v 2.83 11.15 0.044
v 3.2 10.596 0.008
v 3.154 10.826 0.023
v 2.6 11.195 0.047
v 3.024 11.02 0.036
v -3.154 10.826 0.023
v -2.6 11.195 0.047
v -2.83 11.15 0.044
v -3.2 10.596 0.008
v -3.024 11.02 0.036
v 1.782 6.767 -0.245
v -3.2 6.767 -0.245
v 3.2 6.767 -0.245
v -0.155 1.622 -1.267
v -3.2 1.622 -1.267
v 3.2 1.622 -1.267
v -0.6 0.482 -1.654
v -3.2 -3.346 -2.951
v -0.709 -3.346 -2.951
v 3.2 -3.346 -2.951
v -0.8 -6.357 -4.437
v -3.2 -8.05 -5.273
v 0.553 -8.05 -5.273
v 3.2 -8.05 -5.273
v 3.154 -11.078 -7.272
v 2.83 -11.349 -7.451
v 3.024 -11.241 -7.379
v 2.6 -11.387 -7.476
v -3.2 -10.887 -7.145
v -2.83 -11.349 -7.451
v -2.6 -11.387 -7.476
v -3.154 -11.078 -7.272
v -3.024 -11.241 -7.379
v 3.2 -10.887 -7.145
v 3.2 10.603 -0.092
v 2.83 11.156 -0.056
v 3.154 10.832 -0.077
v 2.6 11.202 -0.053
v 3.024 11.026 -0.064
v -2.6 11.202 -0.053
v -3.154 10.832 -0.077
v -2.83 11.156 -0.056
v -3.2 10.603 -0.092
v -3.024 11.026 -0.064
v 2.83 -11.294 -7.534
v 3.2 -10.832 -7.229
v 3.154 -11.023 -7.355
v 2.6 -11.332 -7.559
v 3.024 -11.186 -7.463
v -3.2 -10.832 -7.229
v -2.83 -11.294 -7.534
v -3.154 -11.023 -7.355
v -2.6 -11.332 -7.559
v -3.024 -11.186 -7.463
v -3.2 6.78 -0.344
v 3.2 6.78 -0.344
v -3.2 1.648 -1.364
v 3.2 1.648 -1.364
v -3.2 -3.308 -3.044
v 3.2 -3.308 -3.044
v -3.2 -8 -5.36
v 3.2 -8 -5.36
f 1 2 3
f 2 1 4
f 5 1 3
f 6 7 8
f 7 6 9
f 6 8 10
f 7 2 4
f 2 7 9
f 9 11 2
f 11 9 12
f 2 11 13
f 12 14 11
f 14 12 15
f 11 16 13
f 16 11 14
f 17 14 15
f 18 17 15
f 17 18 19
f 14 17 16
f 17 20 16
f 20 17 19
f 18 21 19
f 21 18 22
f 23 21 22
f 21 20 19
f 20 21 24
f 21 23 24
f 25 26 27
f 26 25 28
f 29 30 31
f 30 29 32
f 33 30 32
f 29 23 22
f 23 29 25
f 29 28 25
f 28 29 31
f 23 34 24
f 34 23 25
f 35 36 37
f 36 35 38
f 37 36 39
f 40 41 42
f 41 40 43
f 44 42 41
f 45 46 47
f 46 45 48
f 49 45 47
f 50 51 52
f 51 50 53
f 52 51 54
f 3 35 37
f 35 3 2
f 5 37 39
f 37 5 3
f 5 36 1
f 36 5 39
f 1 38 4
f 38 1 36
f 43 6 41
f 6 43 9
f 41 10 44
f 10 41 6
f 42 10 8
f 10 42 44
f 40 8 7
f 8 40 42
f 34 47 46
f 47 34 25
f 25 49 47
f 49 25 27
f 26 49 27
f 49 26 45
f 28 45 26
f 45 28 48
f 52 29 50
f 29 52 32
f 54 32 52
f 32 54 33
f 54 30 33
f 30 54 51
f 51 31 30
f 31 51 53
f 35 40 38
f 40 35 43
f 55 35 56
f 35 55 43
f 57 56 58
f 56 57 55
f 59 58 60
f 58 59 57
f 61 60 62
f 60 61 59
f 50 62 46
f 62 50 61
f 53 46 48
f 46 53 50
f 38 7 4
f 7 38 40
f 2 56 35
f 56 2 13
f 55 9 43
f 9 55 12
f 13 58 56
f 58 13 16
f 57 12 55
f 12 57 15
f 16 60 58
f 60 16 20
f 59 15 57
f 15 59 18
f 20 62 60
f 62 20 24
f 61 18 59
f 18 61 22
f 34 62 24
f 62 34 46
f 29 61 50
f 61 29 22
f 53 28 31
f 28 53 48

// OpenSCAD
// file: ../p/empty.scad
use <../lib.scad>
function ldraw_lib__empty() = [
// 0 Empty
// 0 Name: empty.dat
// 0 Author: Steffen [Steffen]
// 0 !LDRAW_ORG Primitive UPDATE 2015-01
// 0 !LICENSE Licensed under CC BY 4.0 : see CAreadme.txt
// 
// 0 BFC CERTIFY CCW
  [0,"BFC","CERTIFY"],
  [0,"BFC","CCW"],
// 
// 0 !HISTORY 2015-10-11 [PTadmin] Official Update 2015-01
// 
// 
// 0 // Tool MLCad cannot handle really empty files. This file is used as a workaround.
// 0 // It exceptionally contains forbidden non-LDRAW standard syntax to satisfy MLCad until it is fixed OR a different editor has become the de-facto LDRAW standard.
// 0 // The line being used here is an "impossible" conditional line which never should be visible,
// 0 // additionally hidden by a syntax explicitly hiding it from displaying.
// 
// 0 MLCAD HIDE 5 24 0 0 0 0.0001 0 0 0.0001 -0.0001 0 0 0 0
];
module ldraw_lib__empty(step=0, col=false, unit=2/5, alt=false, line=0.2, solid=!$preview)
    makepoly(ldraw_lib__empty(), step=step, col=col, unit=unit, alt=alt, line=line, solid=solid);
ldraw_lib__empty(line=0.2);
// file: ../p/1-4cyli.scad
use <../lib.scad>
function ldraw_lib__1_4cyli() = [
// 0 Cylinder 0.25
// 0 Name: 1-4cyli.dat
// 0 Author: James Jessiman
// 0 !LDRAW_ORG Primitive UPDATE 2012-01
// 0 !LICENSE Licensed under CC BY 4.0 : see CAreadme.txt
// 
// 0 BFC CERTIFY CCW
  [0,"BFC","CERTIFY"],
  [0,"BFC","CCW"],
// 
// 0 !HISTORY 2002-03-23 [sbliss] Added BFC statement.
// 0 !HISTORY 2002-04-25 [PTadmin] Official Update 2002-02
// 0 !HISTORY 2007-06-22 [PTadmin] Header formatted for Contributor Agreement
// 0 !HISTORY 2008-07-01 [PTadmin] Official Update 2008-01
// 0 !HISTORY 2012-02-16 [Philo] Changed to CCW
// 0 !HISTORY 2012-03-30 [PTadmin] Official Update 2012-01
// 
// 
// 4 16 1 1 0 0.9239 1 0.3827 0.9239 0 0.3827 1 0 0
  [4,16,1,1,0,0.9239,1,0.3827,0.9239,0,0.3827,1,0,0],
// 5 24 1 0 0 1 1 0 0.9239 0 0.3827 1 0 -1
  [5,24,1,0,0,1,1,0,0.9239,0,0.3827,1,0,-1],
// 4 16 0.9239 1 0.3827 0.7071 1 0.7071 0.7071 0 0.7071 0.9239 0 0.3827
  [4,16,0.9239,1,0.3827,0.7071,1,0.7071,0.7071,0,0.7071,0.9239,0,0.3827],
// 5 24 0.9239 0 0.3827 0.9239 1 0.3827 0.7071 0 0.7071 1 0 0
  [5,24,0.9239,0,0.3827,0.9239,1,0.3827,0.7071,0,0.7071,1,0,0],
// 4 16 0.7071 1 0.7071 0.3827 1 0.9239 0.3827 0 0.9239 0.7071 0 0.7071
  [4,16,0.7071,1,0.7071,0.3827,1,0.9239,0.3827,0,0.9239,0.7071,0,0.7071],
// 5 24 0.7071 0 0.7071 0.7071 1 0.7071 0.3827 0 0.9239 0.9239 0 0.3827
  [5,24,0.7071,0,0.7071,0.7071,1,0.7071,0.3827,0,0.9239,0.9239,0,0.3827],
// 4 16 0.3827 1 0.9239 0 1 1 0 0 1 0.3827 0 0.9239
  [4,16,0.3827,1,0.9239,0,1,1,0,0,1,0.3827,0,0.9239],
// 5 24 0.3827 0 0.9239 0.3827 1 0.9239 0 0 1 0.7071 0 0.7071
  [5,24,0.3827,0,0.9239,0.3827,1,0.9239,0,0,1,0.7071,0,0.7071],
// 5 24 0 0 1 0 1 1 0.3827 0 0.9239 -1 0 1
  [5,24,0,0,1,0,1,1,0.3827,0,0.9239,-1,0,1],
];
module ldraw_lib__1_4cyli(step=0, col=false, unit=2/5, alt=false, line=0.2, solid=!$preview)
    makepoly(ldraw_lib__1_4cyli(), step=step, col=col, unit=unit, alt=alt, line=line, solid=solid);
ldraw_lib__1_4cyli(line=0.2);
// file: ../p/3-16chrd.scad
use <../lib.scad>
function ldraw_lib__3_16chrd() = [
// 0 Chord 0.1875
// 0 Name: 3-16chrd.dat
// 0 Author: Niels Karsdorp [nielsk]
// 0 !LDRAW_ORG Primitive UPDATE 2009-01
// 0 !LICENSE Licensed under CC BY 4.0 : see CAreadme.txt
// 
// 0 BFC CERTIFY CCW
  [0,"BFC","CERTIFY"],
  [0,"BFC","CCW"],
// 
// 0 !HISTORY 2009-05-02 [PTadmin] Official Update 2009-01
// 
// 
// 4 16 1 0 0 0.9239 0 0.3827 0.7071 0 0.7071 0.3827 0 0.9239
  [4,16,1,0,0,0.9239,0,0.3827,0.7071,0,0.7071,0.3827,0,0.9239],
// 0
// 
];
module ldraw_lib__3_16chrd(step=0, col=false, unit=2/5, alt=false, line=0.2, solid=!$preview)
    makepoly(ldraw_lib__3_16chrd(), step=step, col=col, unit=unit, alt=alt, line=line, solid=solid);
ldraw_lib__3_16chrd(line=0.2);
// file: ../p/1-16chrd.scad
use <../lib.scad>
use <empty.scad>
function ldraw_lib__1_16chrd() = [
// 0 Chord 0.0625
// 0 Name: 1-16chrd.dat
// 0 Author: Philippe Hurbain [Philo]
// 0 !LDRAW_ORG Primitive UPDATE 2015-01
// 0 !LICENSE Licensed under CC BY 4.0 : see CAreadme.txt
// 
// 0 BFC CERTIFY CCW
  [0,"BFC","CERTIFY"],
  [0,"BFC","CCW"],
// 
// 0 !HISTORY 2015-10-11 [PTadmin] Official Update 2015-01
// 
// 
// 0 // This file is intentionally empty because at the current \P resolution,
// 0 // an 1-16chrd is actually empty. However, this file still is present
// 0 // to allow tools to do primitives substition and fill in a real chrd here,
// 0 // or, if desired, to substitute this with the hi-res 48\1-16chrd.
// 
// 0 // This file is based on an idea by Darats at http://forums.ldraw.org/read.php?19,14500,14500#msg-14500
// 
// 1 16 0 0 0 1 0 0 0 1 0 0 0 1 empty.dat
  [1,16,0,0,0,1,0,0,0,1,0,0,0,1, ldraw_lib__empty()],
];
module ldraw_lib__1_16chrd(step=0, col=false, unit=2/5, alt=false, line=0.2, solid=!$preview)
    makepoly(ldraw_lib__1_16chrd(), step=step, col=col, unit=unit, alt=alt, line=line, solid=solid);
ldraw_lib__1_16chrd(line=0.2);
// file: ../p/1-4chrd.scad
use <../lib.scad>
function ldraw_lib__1_4chrd() = [
// 0 Chord 0.25
// 0 Name: 1-4chrd.dat
// 0 Author: Max Martin Richter [MMR1988]
// 0 !LDRAW_ORG Primitive UPDATE 2023-05
// 0 !LICENSE Licensed under CC BY 4.0 : see CAreadme.txt
// 
// 0 BFC CERTIFY CCW
  [0,"BFC","CERTIFY"],
  [0,"BFC","CCW"],
// 
// 0 !HISTORY 2004-04-22 [PTadmin] Official Update 2004-02
// 0 !HISTORY 2007-10-09 [PTadmin] Header formatted for Contributor Agreement
// 0 !HISTORY 2008-07-01 [PTadmin] Official Update 2008-01
// 0 !HISTORY 2012-08-02 [MMR1988] Re-creation with PrimGen2 and Rectifier
// 0 !HISTORY 2012-08-09 [PTadmin] Official Update 2012-02
// 0 !HISTORY 2023-10-27 [OrionP] Change author to MMR1988 from hafhead
// 0 !HISTORY 2023-10-31 [OrionP] Official Update 2023-05
// 
// 4 16 0.9239 0 0.3827 0.3827 0 0.9239 0 0 1 1 0 0
  [4,16,0.9239,0,0.3827,0.3827,0,0.9239,0,0,1,1,0,0],
// 3 16 0.7071 0 0.7071 0.3827 0 0.9239 0.9239 0 0.3827
  [3,16,0.7071,0,0.7071,0.3827,0,0.9239,0.9239,0,0.3827],
];
module ldraw_lib__1_4chrd(step=0, col=false, unit=2/5, alt=false, line=0.2, solid=!$preview)
    makepoly(ldraw_lib__1_4chrd(), step=step, col=col, unit=unit, alt=alt, line=line, solid=solid);
ldraw_lib__1_4chrd(line=0.2);
// file: s/6142275ws07.scad
use <../../lib.scad>
use <../../p/1-4chrd.scad>
use <../../p/1-4cyli.scad>
function ldraw_lib__s__6142275ws07() = [
// 0 ~Sticker  0.8 x  3.1 with White Trapezoid on Grey Background Left - Bottom Formed Face
// 0 Name: s\6142275ws07.dat
// 0 Author: Massimo Maso [Sirio]
// 0 !LDRAW_ORG Subpart UPDATE 2023-06
// 0 !LICENSE Licensed under CC BY 4.0 : see CAreadme.txt
// 
// 0 BFC CERTIFY CCW
  [0,"BFC","CERTIFY"],
  [0,"BFC","CCW"],
// 
// 0 !HISTORY 2023-11-19 [OrionP] Official Update 2023-06
// 
// 
// 0 // Primitives
// 1 16 -6.5 .2302 26.5076 -1.5 0 0 0 -.997836 -.098638 0 -.065758 1.496753 1-4chrd.dat
  [1,16,-6.5,.2302,26.5076,-1.5,0,0,0,-.997836,-.098638,0,-.065758,1.496753, ldraw_lib__1_4chrd()],
// 1 16 6.5 .2302 26.5076 1.5 0 0 0 -.997836 -.098638 0 -.065758 1.496753 1-4chrd.dat
  [1,16,6.5,.2302,26.5076,1.5,0,0,0,-.997836,-.098638,0,-.065758,1.496753, ldraw_lib__1_4chrd()],
// 1 16 -6.5 18.0721 -27.0789 -1.5 0 0 0 -.83461 .826263 0 -.550842 -1.251914 1-4chrd.dat
  [1,16,-6.5,18.0721,-27.0789,-1.5,0,0,0,-.83461,.826263,0,-.550842,-1.251914, ldraw_lib__1_4chrd()],
// 1 16 6.5 18.0721 -27.0789 1.5 0 0 0 -.83461 .826263 0 -.550842 -1.251914 1-4chrd.dat
  [1,16,6.5,18.0721,-27.0789,1.5,0,0,0,-.83461,.826263,0,-.550842,-1.251914, ldraw_lib__1_4chrd()],
// 1 16 -6.5 .2302 26.5076 -1.5 0 0 0 -.249459 -.098638 0 -.01644 1.496753 1-4cyli.dat
  [1,16,-6.5,.2302,26.5076,-1.5,0,0,0,-.249459,-.098638,0,-.01644,1.496753, ldraw_lib__1_4cyli()],
// 1 16 6.5 .2302 26.5076 1.5 0 0 0 -.249459 -.098638 0 -.01644 1.496753 1-4cyli.dat
  [1,16,6.5,.2302,26.5076,1.5,0,0,0,-.249459,-.098638,0,-.01644,1.496753, ldraw_lib__1_4cyli()],
// 1 16 -6.5 18.0721 -27.0789 -1.5 0 0 0 -.208652 .826263 0 -.137711 -1.251914 1-4cyli.dat
  [1,16,-6.5,18.0721,-27.0789,-1.5,0,0,0,-.208652,.826263,0,-.137711,-1.251914, ldraw_lib__1_4cyli()],
// 1 16 6.5 18.0721 -27.0789 1.5 0 0 0 -.208652 .826263 0 -.137711 -1.251914 1-4cyli.dat
  [1,16,6.5,18.0721,-27.0789,1.5,0,0,0,-.208652,.826263,0,-.137711,-1.251914, ldraw_lib__1_4cyli()],
// 0 // Bottom faces
// 4 16 6.5 .1315 28.0043 8 .2302 26.5076 -8 .2302 26.5076 -6.5 .1315 28.0043
  [4,16,6.5,.1315,28.0043,8,.2302,26.5076,-8,.2302,26.5076,-6.5,.1315,28.0043],
// 4 16 8 .2302 26.5076 8 .86 16.95 -8 .86 16.95 -8 .2302 26.5076
  [4,16,8,.2302,26.5076,8,.86,16.95,-8,.86,16.95,-8,.2302,26.5076],
// 4 16 8 .86 16.95 8 3.41 4.12 -8 3.41 4.12 -8 .86 16.95
  [4,16,8,.86,16.95,8,3.41,4.12,-8,3.41,4.12,-8,.86,16.95],
// 4 16 8 3.41 4.12 8 7.61 -8.27 -8 7.61 -8.27 -8 3.41 4.12
  [4,16,8,3.41,4.12,8,7.61,-8.27,-8,7.61,-8.27,-8,3.41,4.12],
// 4 16 8 7.61 -8.27 8 13.4 -20 -8 13.4 -20 -8 7.61 -8.27
  [4,16,8,7.61,-8.27,8,13.4,-20,-8,13.4,-20,-8,7.61,-8.27],
// 4 16 8 13.4 -20 8 18.0721 -27.0789 -8 18.0721 -27.0789 -8 13.4 -20
  [4,16,8,13.4,-20,8,18.0721,-27.0789,-8,18.0721,-27.0789,-8,13.4,-20],
// 4 16 6.5 18.8983 -28.3308 -6.5 18.8983 -28.3308 -8 18.0721 -27.0789 8 18.0721 -27.0789
  [4,16,6.5,18.8983,-28.3308,-6.5,18.8983,-28.3308,-8,18.0721,-27.0789,8,18.0721,-27.0789],
// 0 // Conditional lines
// 5 24 -8 .86 16.95 8 .86 16.95 -8 .2302 26.5076 -8 3.41 4.12
  [5,24,-8,.86,16.95,8,.86,16.95,-8,.2302,26.5076,-8,3.41,4.12],
// 5 24 -8 3.41 4.12 8 3.41 4.12 -8 .86 16.95 -8 7.61 -8.27
  [5,24,-8,3.41,4.12,8,3.41,4.12,-8,.86,16.95,-8,7.61,-8.27],
// 5 24 -8 7.61 -8.27 8 7.61 -8.27 -8 3.41 4.12 -8 13.4 -20
  [5,24,-8,7.61,-8.27,8,7.61,-8.27,-8,3.41,4.12,-8,13.4,-20],
// 5 24 -8 13.4 -20 8 13.4 -20 -8 7.61 -8.27 -8 18.0721 -27.0789
  [5,24,-8,13.4,-20,8,13.4,-20,-8,7.61,-8.27,-8,18.0721,-27.0789],
// 0 // Lateral faces
// 4 16 6.5 .1315 28.0043 -6.5 .1315 28.0043 -6.5 -.1179 27.9879 6.5 -.1179 27.9879
  [4,16,6.5,.1315,28.0043,-6.5,.1315,28.0043,-6.5,-.1179,27.9879,6.5,-.1179,27.9879],
// 4 16 -8 .2302 26.5076 -8 .86 16.95 -8 .6116 16.9173 -8 -.0193 26.4911
  [4,16,-8,.2302,26.5076,-8,.86,16.95,-8,.6116,16.9173,-8,-.0193,26.4911],
// 4 16 8 .6116 16.9173 8 .86 16.95 8 .2302 26.5076 8 -.0193 26.4911
  [4,16,8,.6116,16.9173,8,.86,16.95,8,.2302,26.5076,8,-.0193,26.4911],
// 4 16 -8 .86 16.95 -8 3.41 4.12 -8 3.168 4.0552 -8 .6116 16.9173
  [4,16,-8,.86,16.95,-8,3.41,4.12,-8,3.168,4.0552,-8,.6116,16.9173],
// 4 16 8 3.168 4.0552 8 3.41 4.12 8 .86 16.95 8 .6116 16.9173
  [4,16,8,3.168,4.0552,8,3.41,4.12,8,.86,16.95,8,.6116,16.9173],
// 4 16 -8 3.41 4.12 -8 7.61 -8.27 -8 7.3785 -8.3659 -8 3.168 4.0552
  [4,16,-8,3.41,4.12,-8,7.61,-8.27,-8,7.3785,-8.3659,-8,3.168,4.0552],
// 4 16 8 7.3785 -8.3659 8 7.61 -8.27 8 3.41 4.12 8 3.168 4.0552
  [4,16,8,7.3785,-8.3659,8,7.61,-8.27,8,3.41,4.12,8,3.168,4.0552],
// 4 16 -8 7.61 -8.27 -8 13.4 -20 -8 13.1827 -20.1247 -8 7.3785 -8.3659
  [4,16,-8,7.61,-8.27,-8,13.4,-20,-8,13.1827,-20.1247,-8,7.3785,-8.3659],
// 4 16 8 13.1827 -20.1247 8 13.4 -20 8 7.61 -8.27 8 7.3785 -8.3659
  [4,16,8,13.1827,-20.1247,8,13.4,-20,8,7.61,-8.27,8,7.3785,-8.3659],
// 4 16 -8 13.4 -20 -8 18.0721 -27.0789 -8 17.8634 -27.2166 -8 13.1827 -20.1247
  [4,16,-8,13.4,-20,-8,18.0721,-27.0789,-8,17.8634,-27.2166,-8,13.1827,-20.1247],
// 4 16 8 17.8634 -27.2166 8 18.0721 -27.0789 8 13.4 -20 8 13.1827 -20.1247
  [4,16,8,17.8634,-27.2166,8,18.0721,-27.0789,8,13.4,-20,8,13.1827,-20.1247],
// 4 16 6.5 18.8983 -28.3308 6.5 18.6897 -28.4685 -6.5 18.6897 -28.4685 -6.5 18.8983 -28.3308
  [4,16,6.5,18.8983,-28.3308,6.5,18.6897,-28.4685,-6.5,18.6897,-28.4685,-6.5,18.8983,-28.3308],
// 0 // Conditional lines
// 5 24 -8 .6116 16.9173 8 .6116 16.9173 -8 -.0198 26.5076 -8 3.168 4.0552
  [5,24,-8,.6116,16.9173,8,.6116,16.9173,-8,-.0198,26.5076,-8,3.168,4.0552],
// 5 24 -8 3.168 4.0552 8 3.168 4.0552 -8 .6116 16.9173 -8 7.3785 -8.3659
  [5,24,-8,3.168,4.0552,8,3.168,4.0552,-8,.6116,16.9173,-8,7.3785,-8.3659],
// 5 24 -8 7.3785 -8.3659 8 7.3785 -8.3659 -8 3.168 4.0552 -8 13.1827 -20.1247
  [5,24,-8,7.3785,-8.3659,8,7.3785,-8.3659,-8,3.168,4.0552,-8,13.1827,-20.1247],
// 5 24 -8 13.1827 -20.1247 8 13.1827 -20.1247 -8 7.3785 -8.3659 -8 17.8634 -27.2166
  [5,24,-8,13.1827,-20.1247,8,13.1827,-20.1247,-8,7.3785,-8.3659,-8,17.8634,-27.2166],
];
module ldraw_lib__s__6142275ws07(step=0, col=false, unit=2/5, alt=false, line=0.2, solid=!$preview)
    makepoly(ldraw_lib__s__6142275ws07(), step=step, col=col, unit=unit, alt=alt, line=line, solid=solid);
ldraw_lib__s__6142275ws07(line=0.2);
// file: s/6142275ws05.scad
use <../../lib.scad>
use <../../p/1-16chrd.scad>
use <../../p/1-4chrd.scad>
use <../../p/3-16chrd.scad>
function ldraw_lib__s__6142275ws05() = [
// 0 ~Sticker  0.8 x  3.1 with White Trapezoid on Grey Background Left - Fifth Face
// 0 Name: s\6142275ws05.dat
// 0 Author: Massimo Maso [Sirio]
// 0 !LDRAW_ORG Subpart UPDATE 2023-06
// 0 !LICENSE Licensed under CC BY 4.0 : see CAreadme.txt
// 
// 0 BFC CERTIFY CCW
  [0,"BFC","CERTIFY"],
  [0,"BFC","CCW"],
// 
// 0 !HISTORY 2023-11-19 [OrionP] Official Update 2023-06
// 
// 
// 0 // Primitives
// 1 15 -6.5 -.25 -8.4817 -1.5 0 0 0 1 0 0 0 -1.5 1-16chrd.dat
  [1,15,-6.5,-.25,-8.4817,-1.5,0,0,0,1,0,0,0,-1.5, ldraw_lib__1_16chrd()],
// 1 72 -6.5 -.25 -8.4817 0 0 -1.5 0 1 0 -1.5 0 0 3-16chrd.dat
  [1,72,-6.5,-.25,-8.4817,0,0,-1.5,0,1,0,-1.5,0,0, ldraw_lib__3_16chrd()],
// 1 72 6.5 -.25 -8.4817 1.5 0 0 0 1 0 0 0 -1.5 1-4chrd.dat
  [1,72,6.5,-.25,-8.4817,1.5,0,0,0,1,0,0,0,-1.5, ldraw_lib__1_4chrd()],
// 0 // Grey faces
// 4 72 -7.88585 -.25 -9.05575 8 -.25 -8.4817 8 -.25 .0156 -1.3833 -.25 .0156
  [4,72,-7.88585,-.25,-9.05575,8,-.25,-8.4817,8,-.25,.0156,-1.3833,-.25,.0156],
// 4 72 -7.88585 -.25 -9.05575 -6.5 -.25 -9.9817 6.5 -.25 -9.9817 8 -.25 -8.4817
  [4,72,-7.88585,-.25,-9.05575,-6.5,-.25,-9.9817,6.5,-.25,-9.9817,8,-.25,-8.4817],
// 0 // White face
// 4 15 -7.88585 -.25 -9.05575 -1.3833 -.25 .0156 -8 -.25 .0156 -8 -.25 -8.4817
  [4,15,-7.88585,-.25,-9.05575,-1.3833,-.25,.0156,-8,-.25,.0156,-8,-.25,-8.4817],
];
module ldraw_lib__s__6142275ws05(step=0, col=false, unit=2/5, alt=false, line=0.2, solid=!$preview)
    makepoly(ldraw_lib__s__6142275ws05(), step=step, col=col, unit=unit, alt=alt, line=line, solid=solid);
ldraw_lib__s__6142275ws05(line=0.2);
// file: s/6142275ws04.scad
use <../../lib.scad>
function ldraw_lib__s__6142275ws04() = [
// 0 ~Sticker  0.8 x  3.1 with White Trapezoid on Grey Background Left - Fourth Face
// 0 Name: s\6142275ws04.dat
// 0 Author: Massimo Maso [Sirio]
// 0 !LDRAW_ORG Subpart UPDATE 2023-06
// 0 !LICENSE Licensed under CC BY 4.0 : see CAreadme.txt
// 
// 0 BFC CERTIFY CCW
  [0,"BFC","CERTIFY"],
  [0,"BFC","CCW"],
// 
// 0 !HISTORY 2023-11-19 [OrionP] Official Update 2023-06
// 
// 
// 0 // Grey faces
// 4 72 8 -.25 -.0156 8 -.25 13.0977 1.7731 -.25 13.0977 2 -.25 4.7042
  [4,72,8,-.25,-.0156,8,-.25,13.0977,1.7731,-.25,13.0977,2,-.25,4.7042],
// 3 72 8 -.25 -.0156 2 -.25 4.7042 -1.3833 -.25 -.0156
  [3,72,8,-.25,-.0156,2,-.25,4.7042,-1.3833,-.25,-.0156],
// 0 // White faces
// 4 15 -8 -.25 -.0156 2 -.25 4.7042 1.7731 -.25 13.0977 -8 -.25 13.0977
  [4,15,-8,-.25,-.0156,2,-.25,4.7042,1.7731,-.25,13.0977,-8,-.25,13.0977],
// 3 15 -8 -.25 -.0156 -1.3833 -.25 -.0156 2 -.25 4.7042
  [3,15,-8,-.25,-.0156,-1.3833,-.25,-.0156,2,-.25,4.7042],
];
module ldraw_lib__s__6142275ws04(step=0, col=false, unit=2/5, alt=false, line=0.2, solid=!$preview)
    makepoly(ldraw_lib__s__6142275ws04(), step=step, col=col, unit=unit, alt=alt, line=line, solid=solid);
ldraw_lib__s__6142275ws04(line=0.2);
// file: s/6142275ws03.scad
use <../../lib.scad>
function ldraw_lib__s__6142275ws03() = [
// 0 ~Sticker  0.8 x  3.1 with White Trapezoid on Grey Background Left - Third Face
// 0 Name: s\6142275ws03.dat
// 0 Author: Massimo Maso [Sirio]
// 0 !LDRAW_ORG Subpart UPDATE 2023-06
// 0 !LICENSE Licensed under CC BY 4.0 : see CAreadme.txt
// 
// 0 BFC CERTIFY CCW
  [0,"BFC","CERTIFY"],
  [0,"BFC","CCW"],
// 
// 0 !HISTORY 2023-11-19 [OrionP] Official Update 2023-06
// 
// 
// 0 // Grey facess
// 3 72 8 -.25 13.0988 .3885 -.25 13.0988 1.5 -.25 10.09
  [3,72,8,-.25,13.0988,.3885,-.25,13.0988,1.5,-.25,10.09],
// 4 72 8 -.25 13.0988 1.5 -.25 10.09 1.7731 -.25 -.0165 8 -.25 -.0165
  [4,72,8,-.25,13.0988,1.5,-.25,10.09,1.7731,-.25,-.0165,8,-.25,-.0165],
// 0 // White faces
// 3 15 -8 -.25 13.0988 1.5 -.25 10.09 .3885 -.25 13.0988
  [3,15,-8,-.25,13.0988,1.5,-.25,10.09,.3885,-.25,13.0988],
// 4 15 -8 -.25 13.0988 -8 -.25 -.0165 1.7731 -.25 -.0165 1.5 -.25 10.09
  [4,15,-8,-.25,13.0988,-8,-.25,-.0165,1.7731,-.25,-.0165,1.5,-.25,10.09],
];
module ldraw_lib__s__6142275ws03(step=0, col=false, unit=2/5, alt=false, line=0.2, solid=!$preview)
    makepoly(ldraw_lib__s__6142275ws03(), step=step, col=col, unit=unit, alt=alt, line=line, solid=solid);
ldraw_lib__s__6142275ws03(line=0.2);
// file: s/6142275ws02.scad
use <../../lib.scad>
function ldraw_lib__s__6142275ws02() = [
// 0 ~Sticker  0.8 x  3.1 with White Trapezoid on Grey Background Left - Second Face
// 0 Name: s\6142275ws02.dat
// 0 Author: Massimo Maso [Sirio]
// 0 !LDRAW_ORG Subpart UPDATE 2023-06
// 0 !LICENSE Licensed under CC BY 4.0 : see CAreadme.txt
// 
// 0 BFC CERTIFY CCW
  [0,"BFC","CERTIFY"],
  [0,"BFC","CCW"],
// 
// 0 !HISTORY 2023-11-19 [OrionP] Official Update 2023-06
// 
// 
// 0 // Grey face
// 4 72 -4.4557 -.25 .0163 .3885 -.25 -13.0974 8 -.25 -13.0974 8 -.25 .0163
  [4,72,-4.4557,-.25,.0163,.3885,-.25,-13.0974,8,-.25,-13.0974,8,-.25,.0163],
// 0 // White face
// 4 15 -8 -.25 .0163 -8 -.25 -13.0974 .3885 -.25 -13.0974 -4.4557 -.25 .0163
  [4,15,-8,-.25,.0163,-8,-.25,-13.0974,.3885,-.25,-13.0974,-4.4557,-.25,.0163],
];
module ldraw_lib__s__6142275ws02(step=0, col=false, unit=2/5, alt=false, line=0.2, solid=!$preview)
    makepoly(ldraw_lib__s__6142275ws02(), step=step, col=col, unit=unit, alt=alt, line=line, solid=solid);
ldraw_lib__s__6142275ws02(line=0.2);
// file: s/6142275ws01.scad
use <../../lib.scad>
use <../../p/1-4chrd.scad>
function ldraw_lib__s__6142275ws01() = [
// 0 ~Sticker  0.8 x  3.1 with White Trapezoid on Grey Background Left - First Face
// 0 Name: s\6142275ws01.dat
// 0 Author: Massimo Maso [Sirio]
// 0 !LDRAW_ORG Subpart UPDATE 2023-06
// 0 !LICENSE Licensed under CC BY 4.0 : see CAreadme.txt
// 
// 0 BFC CERTIFY CCW
  [0,"BFC","CERTIFY"],
  [0,"BFC","CCW"],
// 
// 0 !HISTORY 2023-11-19 [OrionP] Official Update 2023-06
// 
// 
// 0 // Primitives
// 1 72 -6.5 -.25 9.5783 -1.5 0 0 0 1 0 0 0 1.5 1-4chrd.dat
  [1,72,-6.5,-.25,9.5783,-1.5,0,0,0,1,0,0,0,1.5, ldraw_lib__1_4chrd()],
// 1 72 6.5 -.25 9.5783 1.5 0 0 0 1 0 0 0 1.5 1-4chrd.dat
  [1,72,6.5,-.25,9.5783,1.5,0,0,0,1,0,0,0,1.5, ldraw_lib__1_4chrd()],
// 0 // Grey faces
// 4 72 -6.5 -.25 11.0783 -8 -.25 9.5783 8 -.25 9.5783 6.5 -.25 11.0783
  [4,72,-6.5,-.25,11.0783,-8,-.25,9.5783,8,-.25,9.5783,6.5,-.25,11.0783],
// 4 72 -8 -.25 9.5783 -4.4557 -.25 -.0163 8 -.25 -.0163 8 -.25 9.5783
  [4,72,-8,-.25,9.5783,-4.4557,-.25,-.0163,8,-.25,-.0163,8,-.25,9.5783],
// 0 // White face
// 3 15 -8 -.25 -.0163 -4.4557 -.25 -.0163 -8 -.25 9.5783
  [3,15,-8,-.25,-.0163,-4.4557,-.25,-.0163,-8,-.25,9.5783],
];
module ldraw_lib__s__6142275ws01(step=0, col=false, unit=2/5, alt=false, line=0.2, solid=!$preview)
    makepoly(ldraw_lib__s__6142275ws01(), step=step, col=col, unit=unit, alt=alt, line=line, solid=solid);
ldraw_lib__s__6142275ws01(line=0.2);
// file: 6142275wc01.scad
use <../lib.scad>
use <s/6142275ws01.scad>
use <s/6142275ws02.scad>
use <s/6142275ws03.scad>
use <s/6142275ws04.scad>
use <s/6142275ws05.scad>
use <s/6142275ws07.scad>
function ldraw_lib__6142275wc01() = [
// 0 Sticker  0.8 x  3.1 with White Trapezoid on Grey Background Left (Formed)
// 0 Name: 6142275wc01.dat
// 0 Author: Massimo Maso [Sirio]
// 0 !LDRAW_ORG Part UPDATE 2023-06
// 0 !LICENSE Licensed under CC BY 4.0 : see CAreadme.txt
// 
// 0 BFC CERTIFY CCW
  [0,"BFC","CERTIFY"],
  [0,"BFC","CCW"],
// 
// 0 !KEYWORDS Audi, e-tron, quattro, R18, Set 75872, Speed Champions
// 
// 0 !HISTORY 2023-11-19 [OrionP] Official Update 2023-06
// 
// 
// 1 16 0 .86 16.95 1 0 0 0 .997836 -.065758 0 .065758 .997836 s\6142275ws01.dat
  [1,16,0,.86,16.95,1,0,0,0,.997836,-.065758,0,.065758,.997836, ldraw_lib__s__6142275ws01()],
// 1 16 0 .86 16.95 1 0 0 0 .980815 -.19494 0 .19494 .980815 s\6142275ws02.dat
  [1,16,0,.86,16.95,1,0,0,0,.980815,-.19494,0,.19494,.980815, ldraw_lib__s__6142275ws02()],
// 1 16 0 7.61 -8.27 1 0 0 0 .947066 -.321039 0 .321039 .947066 s\6142275ws03.dat
  [1,16,0,7.61,-8.27,1,0,0,0,.947066,-.321039,0,.321039,.947066, ldraw_lib__s__6142275ws03()],
// 1 16 0 13.4 -20 1 0 0 0 .896709 -.442621 0 .442621 .896709 s\6142275ws04.dat
  [1,16,0,13.4,-20,1,0,0,0,.896709,-.442621,0,.442621,.896709, ldraw_lib__s__6142275ws04()],
// 1 16 0 13.4 -20 1 0 0 0 .83461 -.550842 0 .550842 .83461 s\6142275ws05.dat
  [1,16,0,13.4,-20,1,0,0,0,.83461,-.550842,0,.550842,.83461, ldraw_lib__s__6142275ws05()],
// 1 16 0 0 0 1 0 0 0 1 0 0 0 1 s\6142275ws07.dat
  [1,16,0,0,0,1,0,0,0,1,0,0,0,1, ldraw_lib__s__6142275ws07()],
];
module ldraw_lib__6142275wc01(step=0, col=false, unit=2/5, alt=false, line=0.2, solid=!$preview)
    makepoly(ldraw_lib__6142275wc01(), step=step, col=col, unit=unit, alt=alt, line=line, solid=solid);
ldraw_lib__6142275wc01(line=0.2);
// main file
use <../lib.scad>
use <6142275wc01.scad>
function ldraw_lib__6142275xc01() = [
// 0 Sticker  0.8 x  3.1 with White Trapezoid on Grey Background Right (Formed)
// 0 Name: 6142275xc01.dat
// 0 Author: Massimo Maso [Sirio]
// 0 !LDRAW_ORG Part UPDATE 2023-06
// 0 !LICENSE Licensed under CC BY 4.0 : see CAreadme.txt
// 
// 0 BFC CERTIFY CCW
  [0,"BFC","CERTIFY"],
  [0,"BFC","CCW"],
// 
// 0 !KEYWORDS Audi, e-tron, quattro, R18, Set 75872, Speed Champions
// 
// 0 !HISTORY 2023-11-19 [OrionP] Official Update 2023-06
// 
// 
// 1 16 0 0 0 -1 0 0 0 1 0 0 0 1 6142275wc01.dat
  [1,16,0,0,0,-1,0,0,0,1,0,0,0,1, ldraw_lib__6142275wc01()],
];
module ldraw_lib__6142275xc01(step=0, col=false, unit=2/5, alt=false, line=0.2, solid=!$preview)
    makepoly(ldraw_lib__6142275xc01(), step=step, col=col, unit=unit, alt=alt, line=line, solid=solid);
ldraw_lib__6142275xc01(line=0.2);
